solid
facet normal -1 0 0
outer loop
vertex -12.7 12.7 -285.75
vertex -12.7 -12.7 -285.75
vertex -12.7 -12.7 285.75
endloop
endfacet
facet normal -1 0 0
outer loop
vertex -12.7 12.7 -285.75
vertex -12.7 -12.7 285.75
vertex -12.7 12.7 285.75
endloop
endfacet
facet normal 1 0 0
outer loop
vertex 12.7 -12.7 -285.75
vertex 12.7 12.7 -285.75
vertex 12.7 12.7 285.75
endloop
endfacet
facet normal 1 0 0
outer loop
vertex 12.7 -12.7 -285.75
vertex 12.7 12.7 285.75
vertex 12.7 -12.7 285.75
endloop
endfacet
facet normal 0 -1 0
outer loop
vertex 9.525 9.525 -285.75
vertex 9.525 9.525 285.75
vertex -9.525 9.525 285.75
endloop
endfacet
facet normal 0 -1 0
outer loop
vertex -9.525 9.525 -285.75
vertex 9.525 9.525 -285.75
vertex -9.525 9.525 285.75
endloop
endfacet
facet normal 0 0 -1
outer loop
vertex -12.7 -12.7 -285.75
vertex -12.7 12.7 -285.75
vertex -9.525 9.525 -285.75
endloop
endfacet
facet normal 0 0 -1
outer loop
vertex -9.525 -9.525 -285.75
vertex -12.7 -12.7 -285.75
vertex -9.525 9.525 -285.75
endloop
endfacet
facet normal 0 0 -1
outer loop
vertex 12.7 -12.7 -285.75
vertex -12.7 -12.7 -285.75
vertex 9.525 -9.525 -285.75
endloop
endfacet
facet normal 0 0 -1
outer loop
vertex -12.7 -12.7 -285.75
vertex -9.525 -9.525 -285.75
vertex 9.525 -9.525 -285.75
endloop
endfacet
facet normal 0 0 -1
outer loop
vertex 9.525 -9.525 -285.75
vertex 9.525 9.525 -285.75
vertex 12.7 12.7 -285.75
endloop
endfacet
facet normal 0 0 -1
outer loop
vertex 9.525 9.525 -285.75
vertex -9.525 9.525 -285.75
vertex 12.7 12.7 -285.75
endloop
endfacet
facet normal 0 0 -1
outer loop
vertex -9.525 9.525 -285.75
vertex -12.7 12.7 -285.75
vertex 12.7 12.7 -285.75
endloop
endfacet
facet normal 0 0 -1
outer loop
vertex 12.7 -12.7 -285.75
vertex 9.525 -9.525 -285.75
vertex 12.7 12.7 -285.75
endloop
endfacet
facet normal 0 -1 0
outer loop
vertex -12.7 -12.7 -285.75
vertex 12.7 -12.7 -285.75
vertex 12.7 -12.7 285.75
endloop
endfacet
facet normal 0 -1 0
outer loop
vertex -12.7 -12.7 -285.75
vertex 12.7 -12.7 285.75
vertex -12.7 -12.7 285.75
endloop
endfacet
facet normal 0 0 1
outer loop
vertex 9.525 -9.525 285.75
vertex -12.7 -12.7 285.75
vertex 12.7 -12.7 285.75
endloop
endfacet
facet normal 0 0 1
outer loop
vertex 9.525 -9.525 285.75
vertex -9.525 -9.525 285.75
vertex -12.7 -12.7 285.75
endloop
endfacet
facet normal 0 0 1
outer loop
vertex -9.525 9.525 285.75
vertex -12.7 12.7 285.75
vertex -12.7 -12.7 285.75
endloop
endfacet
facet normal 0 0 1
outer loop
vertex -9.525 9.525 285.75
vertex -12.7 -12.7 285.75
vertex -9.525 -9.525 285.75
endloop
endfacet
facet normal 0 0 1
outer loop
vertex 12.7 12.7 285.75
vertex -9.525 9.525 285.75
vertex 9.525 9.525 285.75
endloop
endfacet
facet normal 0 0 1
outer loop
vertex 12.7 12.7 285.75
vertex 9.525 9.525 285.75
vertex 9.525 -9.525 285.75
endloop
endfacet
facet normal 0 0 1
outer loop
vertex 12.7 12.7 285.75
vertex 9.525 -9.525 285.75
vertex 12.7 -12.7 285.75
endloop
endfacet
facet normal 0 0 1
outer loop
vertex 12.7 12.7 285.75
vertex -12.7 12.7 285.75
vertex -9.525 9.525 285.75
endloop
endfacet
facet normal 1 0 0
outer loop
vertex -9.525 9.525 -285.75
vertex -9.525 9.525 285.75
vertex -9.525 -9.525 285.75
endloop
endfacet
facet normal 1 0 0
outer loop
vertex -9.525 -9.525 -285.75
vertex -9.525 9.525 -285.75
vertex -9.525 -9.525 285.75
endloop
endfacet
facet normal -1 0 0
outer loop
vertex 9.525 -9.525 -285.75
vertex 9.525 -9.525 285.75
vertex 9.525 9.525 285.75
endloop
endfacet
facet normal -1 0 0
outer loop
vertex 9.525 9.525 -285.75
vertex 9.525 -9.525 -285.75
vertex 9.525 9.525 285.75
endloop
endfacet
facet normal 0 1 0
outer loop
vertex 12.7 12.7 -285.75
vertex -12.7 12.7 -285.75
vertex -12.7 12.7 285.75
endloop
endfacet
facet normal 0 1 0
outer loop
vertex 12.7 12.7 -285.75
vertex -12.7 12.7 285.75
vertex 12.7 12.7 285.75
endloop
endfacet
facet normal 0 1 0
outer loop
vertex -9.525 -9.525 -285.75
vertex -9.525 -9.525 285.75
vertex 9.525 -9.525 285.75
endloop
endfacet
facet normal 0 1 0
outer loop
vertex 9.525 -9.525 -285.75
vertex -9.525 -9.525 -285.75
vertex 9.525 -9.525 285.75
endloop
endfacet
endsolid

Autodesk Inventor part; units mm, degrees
ref_plane "YZ Plane" through (0, 0, 0) normal (1, 0, 0) x (0, 1, 0)
ref_plane "XZ Plane" through (0, 0, 0) normal (0, 1, 0) x (-1, 0, 0)
ref_plane "XY Plane" through (0, 0, 0) normal (0, 0, 1) x (1, 0, 0)
sketch "Sketch1" plane through (0, 0, 0) normal (0, 0, 1) x (1, 0, 0)
  line L0 (-17.78, 0) -> (17.78, 0) projected
  line L1 (0, -17.78) -> (0, 17.78) projected
  line L2 (-12.7, 12.7) -> (12.7, 12.7)
  line L3 (12.7, 12.7) -> (12.7, -12.7)
  line L4 (12.7, -12.7) -> (-12.7, -12.7)
  line L5 (-12.7, -12.7) -> (-12.7, 12.7)
  line L6 (9.525, 9.525) -> (-9.525, 9.525)
  line L7 (-9.525, 9.525) -> (-9.525, -9.525)
  line L8 (-9.525, -9.525) -> (9.525, -9.525)
  line L9 (9.525, -9.525) -> (9.525, 9.525)
  point P0 (0, 0)
  point P1 (-12.7, 0)
  point P2 (0, 12.7)
  dimension "d0" = 25.4
  dimension "d1" = 3.175
extrude "Extrusion1" add sketch "Sketch1" along normal mid plane 571.5 contours L5 L2 L1 L6 L7 L0 | L0 L7 L8 L1 L4 L5 | L1 L8 L9 L0 L3 L4 | L2 L3 L0 L9 L6 L1
properties part number "tubing_template_0.125" material "Aluminum-6061"
